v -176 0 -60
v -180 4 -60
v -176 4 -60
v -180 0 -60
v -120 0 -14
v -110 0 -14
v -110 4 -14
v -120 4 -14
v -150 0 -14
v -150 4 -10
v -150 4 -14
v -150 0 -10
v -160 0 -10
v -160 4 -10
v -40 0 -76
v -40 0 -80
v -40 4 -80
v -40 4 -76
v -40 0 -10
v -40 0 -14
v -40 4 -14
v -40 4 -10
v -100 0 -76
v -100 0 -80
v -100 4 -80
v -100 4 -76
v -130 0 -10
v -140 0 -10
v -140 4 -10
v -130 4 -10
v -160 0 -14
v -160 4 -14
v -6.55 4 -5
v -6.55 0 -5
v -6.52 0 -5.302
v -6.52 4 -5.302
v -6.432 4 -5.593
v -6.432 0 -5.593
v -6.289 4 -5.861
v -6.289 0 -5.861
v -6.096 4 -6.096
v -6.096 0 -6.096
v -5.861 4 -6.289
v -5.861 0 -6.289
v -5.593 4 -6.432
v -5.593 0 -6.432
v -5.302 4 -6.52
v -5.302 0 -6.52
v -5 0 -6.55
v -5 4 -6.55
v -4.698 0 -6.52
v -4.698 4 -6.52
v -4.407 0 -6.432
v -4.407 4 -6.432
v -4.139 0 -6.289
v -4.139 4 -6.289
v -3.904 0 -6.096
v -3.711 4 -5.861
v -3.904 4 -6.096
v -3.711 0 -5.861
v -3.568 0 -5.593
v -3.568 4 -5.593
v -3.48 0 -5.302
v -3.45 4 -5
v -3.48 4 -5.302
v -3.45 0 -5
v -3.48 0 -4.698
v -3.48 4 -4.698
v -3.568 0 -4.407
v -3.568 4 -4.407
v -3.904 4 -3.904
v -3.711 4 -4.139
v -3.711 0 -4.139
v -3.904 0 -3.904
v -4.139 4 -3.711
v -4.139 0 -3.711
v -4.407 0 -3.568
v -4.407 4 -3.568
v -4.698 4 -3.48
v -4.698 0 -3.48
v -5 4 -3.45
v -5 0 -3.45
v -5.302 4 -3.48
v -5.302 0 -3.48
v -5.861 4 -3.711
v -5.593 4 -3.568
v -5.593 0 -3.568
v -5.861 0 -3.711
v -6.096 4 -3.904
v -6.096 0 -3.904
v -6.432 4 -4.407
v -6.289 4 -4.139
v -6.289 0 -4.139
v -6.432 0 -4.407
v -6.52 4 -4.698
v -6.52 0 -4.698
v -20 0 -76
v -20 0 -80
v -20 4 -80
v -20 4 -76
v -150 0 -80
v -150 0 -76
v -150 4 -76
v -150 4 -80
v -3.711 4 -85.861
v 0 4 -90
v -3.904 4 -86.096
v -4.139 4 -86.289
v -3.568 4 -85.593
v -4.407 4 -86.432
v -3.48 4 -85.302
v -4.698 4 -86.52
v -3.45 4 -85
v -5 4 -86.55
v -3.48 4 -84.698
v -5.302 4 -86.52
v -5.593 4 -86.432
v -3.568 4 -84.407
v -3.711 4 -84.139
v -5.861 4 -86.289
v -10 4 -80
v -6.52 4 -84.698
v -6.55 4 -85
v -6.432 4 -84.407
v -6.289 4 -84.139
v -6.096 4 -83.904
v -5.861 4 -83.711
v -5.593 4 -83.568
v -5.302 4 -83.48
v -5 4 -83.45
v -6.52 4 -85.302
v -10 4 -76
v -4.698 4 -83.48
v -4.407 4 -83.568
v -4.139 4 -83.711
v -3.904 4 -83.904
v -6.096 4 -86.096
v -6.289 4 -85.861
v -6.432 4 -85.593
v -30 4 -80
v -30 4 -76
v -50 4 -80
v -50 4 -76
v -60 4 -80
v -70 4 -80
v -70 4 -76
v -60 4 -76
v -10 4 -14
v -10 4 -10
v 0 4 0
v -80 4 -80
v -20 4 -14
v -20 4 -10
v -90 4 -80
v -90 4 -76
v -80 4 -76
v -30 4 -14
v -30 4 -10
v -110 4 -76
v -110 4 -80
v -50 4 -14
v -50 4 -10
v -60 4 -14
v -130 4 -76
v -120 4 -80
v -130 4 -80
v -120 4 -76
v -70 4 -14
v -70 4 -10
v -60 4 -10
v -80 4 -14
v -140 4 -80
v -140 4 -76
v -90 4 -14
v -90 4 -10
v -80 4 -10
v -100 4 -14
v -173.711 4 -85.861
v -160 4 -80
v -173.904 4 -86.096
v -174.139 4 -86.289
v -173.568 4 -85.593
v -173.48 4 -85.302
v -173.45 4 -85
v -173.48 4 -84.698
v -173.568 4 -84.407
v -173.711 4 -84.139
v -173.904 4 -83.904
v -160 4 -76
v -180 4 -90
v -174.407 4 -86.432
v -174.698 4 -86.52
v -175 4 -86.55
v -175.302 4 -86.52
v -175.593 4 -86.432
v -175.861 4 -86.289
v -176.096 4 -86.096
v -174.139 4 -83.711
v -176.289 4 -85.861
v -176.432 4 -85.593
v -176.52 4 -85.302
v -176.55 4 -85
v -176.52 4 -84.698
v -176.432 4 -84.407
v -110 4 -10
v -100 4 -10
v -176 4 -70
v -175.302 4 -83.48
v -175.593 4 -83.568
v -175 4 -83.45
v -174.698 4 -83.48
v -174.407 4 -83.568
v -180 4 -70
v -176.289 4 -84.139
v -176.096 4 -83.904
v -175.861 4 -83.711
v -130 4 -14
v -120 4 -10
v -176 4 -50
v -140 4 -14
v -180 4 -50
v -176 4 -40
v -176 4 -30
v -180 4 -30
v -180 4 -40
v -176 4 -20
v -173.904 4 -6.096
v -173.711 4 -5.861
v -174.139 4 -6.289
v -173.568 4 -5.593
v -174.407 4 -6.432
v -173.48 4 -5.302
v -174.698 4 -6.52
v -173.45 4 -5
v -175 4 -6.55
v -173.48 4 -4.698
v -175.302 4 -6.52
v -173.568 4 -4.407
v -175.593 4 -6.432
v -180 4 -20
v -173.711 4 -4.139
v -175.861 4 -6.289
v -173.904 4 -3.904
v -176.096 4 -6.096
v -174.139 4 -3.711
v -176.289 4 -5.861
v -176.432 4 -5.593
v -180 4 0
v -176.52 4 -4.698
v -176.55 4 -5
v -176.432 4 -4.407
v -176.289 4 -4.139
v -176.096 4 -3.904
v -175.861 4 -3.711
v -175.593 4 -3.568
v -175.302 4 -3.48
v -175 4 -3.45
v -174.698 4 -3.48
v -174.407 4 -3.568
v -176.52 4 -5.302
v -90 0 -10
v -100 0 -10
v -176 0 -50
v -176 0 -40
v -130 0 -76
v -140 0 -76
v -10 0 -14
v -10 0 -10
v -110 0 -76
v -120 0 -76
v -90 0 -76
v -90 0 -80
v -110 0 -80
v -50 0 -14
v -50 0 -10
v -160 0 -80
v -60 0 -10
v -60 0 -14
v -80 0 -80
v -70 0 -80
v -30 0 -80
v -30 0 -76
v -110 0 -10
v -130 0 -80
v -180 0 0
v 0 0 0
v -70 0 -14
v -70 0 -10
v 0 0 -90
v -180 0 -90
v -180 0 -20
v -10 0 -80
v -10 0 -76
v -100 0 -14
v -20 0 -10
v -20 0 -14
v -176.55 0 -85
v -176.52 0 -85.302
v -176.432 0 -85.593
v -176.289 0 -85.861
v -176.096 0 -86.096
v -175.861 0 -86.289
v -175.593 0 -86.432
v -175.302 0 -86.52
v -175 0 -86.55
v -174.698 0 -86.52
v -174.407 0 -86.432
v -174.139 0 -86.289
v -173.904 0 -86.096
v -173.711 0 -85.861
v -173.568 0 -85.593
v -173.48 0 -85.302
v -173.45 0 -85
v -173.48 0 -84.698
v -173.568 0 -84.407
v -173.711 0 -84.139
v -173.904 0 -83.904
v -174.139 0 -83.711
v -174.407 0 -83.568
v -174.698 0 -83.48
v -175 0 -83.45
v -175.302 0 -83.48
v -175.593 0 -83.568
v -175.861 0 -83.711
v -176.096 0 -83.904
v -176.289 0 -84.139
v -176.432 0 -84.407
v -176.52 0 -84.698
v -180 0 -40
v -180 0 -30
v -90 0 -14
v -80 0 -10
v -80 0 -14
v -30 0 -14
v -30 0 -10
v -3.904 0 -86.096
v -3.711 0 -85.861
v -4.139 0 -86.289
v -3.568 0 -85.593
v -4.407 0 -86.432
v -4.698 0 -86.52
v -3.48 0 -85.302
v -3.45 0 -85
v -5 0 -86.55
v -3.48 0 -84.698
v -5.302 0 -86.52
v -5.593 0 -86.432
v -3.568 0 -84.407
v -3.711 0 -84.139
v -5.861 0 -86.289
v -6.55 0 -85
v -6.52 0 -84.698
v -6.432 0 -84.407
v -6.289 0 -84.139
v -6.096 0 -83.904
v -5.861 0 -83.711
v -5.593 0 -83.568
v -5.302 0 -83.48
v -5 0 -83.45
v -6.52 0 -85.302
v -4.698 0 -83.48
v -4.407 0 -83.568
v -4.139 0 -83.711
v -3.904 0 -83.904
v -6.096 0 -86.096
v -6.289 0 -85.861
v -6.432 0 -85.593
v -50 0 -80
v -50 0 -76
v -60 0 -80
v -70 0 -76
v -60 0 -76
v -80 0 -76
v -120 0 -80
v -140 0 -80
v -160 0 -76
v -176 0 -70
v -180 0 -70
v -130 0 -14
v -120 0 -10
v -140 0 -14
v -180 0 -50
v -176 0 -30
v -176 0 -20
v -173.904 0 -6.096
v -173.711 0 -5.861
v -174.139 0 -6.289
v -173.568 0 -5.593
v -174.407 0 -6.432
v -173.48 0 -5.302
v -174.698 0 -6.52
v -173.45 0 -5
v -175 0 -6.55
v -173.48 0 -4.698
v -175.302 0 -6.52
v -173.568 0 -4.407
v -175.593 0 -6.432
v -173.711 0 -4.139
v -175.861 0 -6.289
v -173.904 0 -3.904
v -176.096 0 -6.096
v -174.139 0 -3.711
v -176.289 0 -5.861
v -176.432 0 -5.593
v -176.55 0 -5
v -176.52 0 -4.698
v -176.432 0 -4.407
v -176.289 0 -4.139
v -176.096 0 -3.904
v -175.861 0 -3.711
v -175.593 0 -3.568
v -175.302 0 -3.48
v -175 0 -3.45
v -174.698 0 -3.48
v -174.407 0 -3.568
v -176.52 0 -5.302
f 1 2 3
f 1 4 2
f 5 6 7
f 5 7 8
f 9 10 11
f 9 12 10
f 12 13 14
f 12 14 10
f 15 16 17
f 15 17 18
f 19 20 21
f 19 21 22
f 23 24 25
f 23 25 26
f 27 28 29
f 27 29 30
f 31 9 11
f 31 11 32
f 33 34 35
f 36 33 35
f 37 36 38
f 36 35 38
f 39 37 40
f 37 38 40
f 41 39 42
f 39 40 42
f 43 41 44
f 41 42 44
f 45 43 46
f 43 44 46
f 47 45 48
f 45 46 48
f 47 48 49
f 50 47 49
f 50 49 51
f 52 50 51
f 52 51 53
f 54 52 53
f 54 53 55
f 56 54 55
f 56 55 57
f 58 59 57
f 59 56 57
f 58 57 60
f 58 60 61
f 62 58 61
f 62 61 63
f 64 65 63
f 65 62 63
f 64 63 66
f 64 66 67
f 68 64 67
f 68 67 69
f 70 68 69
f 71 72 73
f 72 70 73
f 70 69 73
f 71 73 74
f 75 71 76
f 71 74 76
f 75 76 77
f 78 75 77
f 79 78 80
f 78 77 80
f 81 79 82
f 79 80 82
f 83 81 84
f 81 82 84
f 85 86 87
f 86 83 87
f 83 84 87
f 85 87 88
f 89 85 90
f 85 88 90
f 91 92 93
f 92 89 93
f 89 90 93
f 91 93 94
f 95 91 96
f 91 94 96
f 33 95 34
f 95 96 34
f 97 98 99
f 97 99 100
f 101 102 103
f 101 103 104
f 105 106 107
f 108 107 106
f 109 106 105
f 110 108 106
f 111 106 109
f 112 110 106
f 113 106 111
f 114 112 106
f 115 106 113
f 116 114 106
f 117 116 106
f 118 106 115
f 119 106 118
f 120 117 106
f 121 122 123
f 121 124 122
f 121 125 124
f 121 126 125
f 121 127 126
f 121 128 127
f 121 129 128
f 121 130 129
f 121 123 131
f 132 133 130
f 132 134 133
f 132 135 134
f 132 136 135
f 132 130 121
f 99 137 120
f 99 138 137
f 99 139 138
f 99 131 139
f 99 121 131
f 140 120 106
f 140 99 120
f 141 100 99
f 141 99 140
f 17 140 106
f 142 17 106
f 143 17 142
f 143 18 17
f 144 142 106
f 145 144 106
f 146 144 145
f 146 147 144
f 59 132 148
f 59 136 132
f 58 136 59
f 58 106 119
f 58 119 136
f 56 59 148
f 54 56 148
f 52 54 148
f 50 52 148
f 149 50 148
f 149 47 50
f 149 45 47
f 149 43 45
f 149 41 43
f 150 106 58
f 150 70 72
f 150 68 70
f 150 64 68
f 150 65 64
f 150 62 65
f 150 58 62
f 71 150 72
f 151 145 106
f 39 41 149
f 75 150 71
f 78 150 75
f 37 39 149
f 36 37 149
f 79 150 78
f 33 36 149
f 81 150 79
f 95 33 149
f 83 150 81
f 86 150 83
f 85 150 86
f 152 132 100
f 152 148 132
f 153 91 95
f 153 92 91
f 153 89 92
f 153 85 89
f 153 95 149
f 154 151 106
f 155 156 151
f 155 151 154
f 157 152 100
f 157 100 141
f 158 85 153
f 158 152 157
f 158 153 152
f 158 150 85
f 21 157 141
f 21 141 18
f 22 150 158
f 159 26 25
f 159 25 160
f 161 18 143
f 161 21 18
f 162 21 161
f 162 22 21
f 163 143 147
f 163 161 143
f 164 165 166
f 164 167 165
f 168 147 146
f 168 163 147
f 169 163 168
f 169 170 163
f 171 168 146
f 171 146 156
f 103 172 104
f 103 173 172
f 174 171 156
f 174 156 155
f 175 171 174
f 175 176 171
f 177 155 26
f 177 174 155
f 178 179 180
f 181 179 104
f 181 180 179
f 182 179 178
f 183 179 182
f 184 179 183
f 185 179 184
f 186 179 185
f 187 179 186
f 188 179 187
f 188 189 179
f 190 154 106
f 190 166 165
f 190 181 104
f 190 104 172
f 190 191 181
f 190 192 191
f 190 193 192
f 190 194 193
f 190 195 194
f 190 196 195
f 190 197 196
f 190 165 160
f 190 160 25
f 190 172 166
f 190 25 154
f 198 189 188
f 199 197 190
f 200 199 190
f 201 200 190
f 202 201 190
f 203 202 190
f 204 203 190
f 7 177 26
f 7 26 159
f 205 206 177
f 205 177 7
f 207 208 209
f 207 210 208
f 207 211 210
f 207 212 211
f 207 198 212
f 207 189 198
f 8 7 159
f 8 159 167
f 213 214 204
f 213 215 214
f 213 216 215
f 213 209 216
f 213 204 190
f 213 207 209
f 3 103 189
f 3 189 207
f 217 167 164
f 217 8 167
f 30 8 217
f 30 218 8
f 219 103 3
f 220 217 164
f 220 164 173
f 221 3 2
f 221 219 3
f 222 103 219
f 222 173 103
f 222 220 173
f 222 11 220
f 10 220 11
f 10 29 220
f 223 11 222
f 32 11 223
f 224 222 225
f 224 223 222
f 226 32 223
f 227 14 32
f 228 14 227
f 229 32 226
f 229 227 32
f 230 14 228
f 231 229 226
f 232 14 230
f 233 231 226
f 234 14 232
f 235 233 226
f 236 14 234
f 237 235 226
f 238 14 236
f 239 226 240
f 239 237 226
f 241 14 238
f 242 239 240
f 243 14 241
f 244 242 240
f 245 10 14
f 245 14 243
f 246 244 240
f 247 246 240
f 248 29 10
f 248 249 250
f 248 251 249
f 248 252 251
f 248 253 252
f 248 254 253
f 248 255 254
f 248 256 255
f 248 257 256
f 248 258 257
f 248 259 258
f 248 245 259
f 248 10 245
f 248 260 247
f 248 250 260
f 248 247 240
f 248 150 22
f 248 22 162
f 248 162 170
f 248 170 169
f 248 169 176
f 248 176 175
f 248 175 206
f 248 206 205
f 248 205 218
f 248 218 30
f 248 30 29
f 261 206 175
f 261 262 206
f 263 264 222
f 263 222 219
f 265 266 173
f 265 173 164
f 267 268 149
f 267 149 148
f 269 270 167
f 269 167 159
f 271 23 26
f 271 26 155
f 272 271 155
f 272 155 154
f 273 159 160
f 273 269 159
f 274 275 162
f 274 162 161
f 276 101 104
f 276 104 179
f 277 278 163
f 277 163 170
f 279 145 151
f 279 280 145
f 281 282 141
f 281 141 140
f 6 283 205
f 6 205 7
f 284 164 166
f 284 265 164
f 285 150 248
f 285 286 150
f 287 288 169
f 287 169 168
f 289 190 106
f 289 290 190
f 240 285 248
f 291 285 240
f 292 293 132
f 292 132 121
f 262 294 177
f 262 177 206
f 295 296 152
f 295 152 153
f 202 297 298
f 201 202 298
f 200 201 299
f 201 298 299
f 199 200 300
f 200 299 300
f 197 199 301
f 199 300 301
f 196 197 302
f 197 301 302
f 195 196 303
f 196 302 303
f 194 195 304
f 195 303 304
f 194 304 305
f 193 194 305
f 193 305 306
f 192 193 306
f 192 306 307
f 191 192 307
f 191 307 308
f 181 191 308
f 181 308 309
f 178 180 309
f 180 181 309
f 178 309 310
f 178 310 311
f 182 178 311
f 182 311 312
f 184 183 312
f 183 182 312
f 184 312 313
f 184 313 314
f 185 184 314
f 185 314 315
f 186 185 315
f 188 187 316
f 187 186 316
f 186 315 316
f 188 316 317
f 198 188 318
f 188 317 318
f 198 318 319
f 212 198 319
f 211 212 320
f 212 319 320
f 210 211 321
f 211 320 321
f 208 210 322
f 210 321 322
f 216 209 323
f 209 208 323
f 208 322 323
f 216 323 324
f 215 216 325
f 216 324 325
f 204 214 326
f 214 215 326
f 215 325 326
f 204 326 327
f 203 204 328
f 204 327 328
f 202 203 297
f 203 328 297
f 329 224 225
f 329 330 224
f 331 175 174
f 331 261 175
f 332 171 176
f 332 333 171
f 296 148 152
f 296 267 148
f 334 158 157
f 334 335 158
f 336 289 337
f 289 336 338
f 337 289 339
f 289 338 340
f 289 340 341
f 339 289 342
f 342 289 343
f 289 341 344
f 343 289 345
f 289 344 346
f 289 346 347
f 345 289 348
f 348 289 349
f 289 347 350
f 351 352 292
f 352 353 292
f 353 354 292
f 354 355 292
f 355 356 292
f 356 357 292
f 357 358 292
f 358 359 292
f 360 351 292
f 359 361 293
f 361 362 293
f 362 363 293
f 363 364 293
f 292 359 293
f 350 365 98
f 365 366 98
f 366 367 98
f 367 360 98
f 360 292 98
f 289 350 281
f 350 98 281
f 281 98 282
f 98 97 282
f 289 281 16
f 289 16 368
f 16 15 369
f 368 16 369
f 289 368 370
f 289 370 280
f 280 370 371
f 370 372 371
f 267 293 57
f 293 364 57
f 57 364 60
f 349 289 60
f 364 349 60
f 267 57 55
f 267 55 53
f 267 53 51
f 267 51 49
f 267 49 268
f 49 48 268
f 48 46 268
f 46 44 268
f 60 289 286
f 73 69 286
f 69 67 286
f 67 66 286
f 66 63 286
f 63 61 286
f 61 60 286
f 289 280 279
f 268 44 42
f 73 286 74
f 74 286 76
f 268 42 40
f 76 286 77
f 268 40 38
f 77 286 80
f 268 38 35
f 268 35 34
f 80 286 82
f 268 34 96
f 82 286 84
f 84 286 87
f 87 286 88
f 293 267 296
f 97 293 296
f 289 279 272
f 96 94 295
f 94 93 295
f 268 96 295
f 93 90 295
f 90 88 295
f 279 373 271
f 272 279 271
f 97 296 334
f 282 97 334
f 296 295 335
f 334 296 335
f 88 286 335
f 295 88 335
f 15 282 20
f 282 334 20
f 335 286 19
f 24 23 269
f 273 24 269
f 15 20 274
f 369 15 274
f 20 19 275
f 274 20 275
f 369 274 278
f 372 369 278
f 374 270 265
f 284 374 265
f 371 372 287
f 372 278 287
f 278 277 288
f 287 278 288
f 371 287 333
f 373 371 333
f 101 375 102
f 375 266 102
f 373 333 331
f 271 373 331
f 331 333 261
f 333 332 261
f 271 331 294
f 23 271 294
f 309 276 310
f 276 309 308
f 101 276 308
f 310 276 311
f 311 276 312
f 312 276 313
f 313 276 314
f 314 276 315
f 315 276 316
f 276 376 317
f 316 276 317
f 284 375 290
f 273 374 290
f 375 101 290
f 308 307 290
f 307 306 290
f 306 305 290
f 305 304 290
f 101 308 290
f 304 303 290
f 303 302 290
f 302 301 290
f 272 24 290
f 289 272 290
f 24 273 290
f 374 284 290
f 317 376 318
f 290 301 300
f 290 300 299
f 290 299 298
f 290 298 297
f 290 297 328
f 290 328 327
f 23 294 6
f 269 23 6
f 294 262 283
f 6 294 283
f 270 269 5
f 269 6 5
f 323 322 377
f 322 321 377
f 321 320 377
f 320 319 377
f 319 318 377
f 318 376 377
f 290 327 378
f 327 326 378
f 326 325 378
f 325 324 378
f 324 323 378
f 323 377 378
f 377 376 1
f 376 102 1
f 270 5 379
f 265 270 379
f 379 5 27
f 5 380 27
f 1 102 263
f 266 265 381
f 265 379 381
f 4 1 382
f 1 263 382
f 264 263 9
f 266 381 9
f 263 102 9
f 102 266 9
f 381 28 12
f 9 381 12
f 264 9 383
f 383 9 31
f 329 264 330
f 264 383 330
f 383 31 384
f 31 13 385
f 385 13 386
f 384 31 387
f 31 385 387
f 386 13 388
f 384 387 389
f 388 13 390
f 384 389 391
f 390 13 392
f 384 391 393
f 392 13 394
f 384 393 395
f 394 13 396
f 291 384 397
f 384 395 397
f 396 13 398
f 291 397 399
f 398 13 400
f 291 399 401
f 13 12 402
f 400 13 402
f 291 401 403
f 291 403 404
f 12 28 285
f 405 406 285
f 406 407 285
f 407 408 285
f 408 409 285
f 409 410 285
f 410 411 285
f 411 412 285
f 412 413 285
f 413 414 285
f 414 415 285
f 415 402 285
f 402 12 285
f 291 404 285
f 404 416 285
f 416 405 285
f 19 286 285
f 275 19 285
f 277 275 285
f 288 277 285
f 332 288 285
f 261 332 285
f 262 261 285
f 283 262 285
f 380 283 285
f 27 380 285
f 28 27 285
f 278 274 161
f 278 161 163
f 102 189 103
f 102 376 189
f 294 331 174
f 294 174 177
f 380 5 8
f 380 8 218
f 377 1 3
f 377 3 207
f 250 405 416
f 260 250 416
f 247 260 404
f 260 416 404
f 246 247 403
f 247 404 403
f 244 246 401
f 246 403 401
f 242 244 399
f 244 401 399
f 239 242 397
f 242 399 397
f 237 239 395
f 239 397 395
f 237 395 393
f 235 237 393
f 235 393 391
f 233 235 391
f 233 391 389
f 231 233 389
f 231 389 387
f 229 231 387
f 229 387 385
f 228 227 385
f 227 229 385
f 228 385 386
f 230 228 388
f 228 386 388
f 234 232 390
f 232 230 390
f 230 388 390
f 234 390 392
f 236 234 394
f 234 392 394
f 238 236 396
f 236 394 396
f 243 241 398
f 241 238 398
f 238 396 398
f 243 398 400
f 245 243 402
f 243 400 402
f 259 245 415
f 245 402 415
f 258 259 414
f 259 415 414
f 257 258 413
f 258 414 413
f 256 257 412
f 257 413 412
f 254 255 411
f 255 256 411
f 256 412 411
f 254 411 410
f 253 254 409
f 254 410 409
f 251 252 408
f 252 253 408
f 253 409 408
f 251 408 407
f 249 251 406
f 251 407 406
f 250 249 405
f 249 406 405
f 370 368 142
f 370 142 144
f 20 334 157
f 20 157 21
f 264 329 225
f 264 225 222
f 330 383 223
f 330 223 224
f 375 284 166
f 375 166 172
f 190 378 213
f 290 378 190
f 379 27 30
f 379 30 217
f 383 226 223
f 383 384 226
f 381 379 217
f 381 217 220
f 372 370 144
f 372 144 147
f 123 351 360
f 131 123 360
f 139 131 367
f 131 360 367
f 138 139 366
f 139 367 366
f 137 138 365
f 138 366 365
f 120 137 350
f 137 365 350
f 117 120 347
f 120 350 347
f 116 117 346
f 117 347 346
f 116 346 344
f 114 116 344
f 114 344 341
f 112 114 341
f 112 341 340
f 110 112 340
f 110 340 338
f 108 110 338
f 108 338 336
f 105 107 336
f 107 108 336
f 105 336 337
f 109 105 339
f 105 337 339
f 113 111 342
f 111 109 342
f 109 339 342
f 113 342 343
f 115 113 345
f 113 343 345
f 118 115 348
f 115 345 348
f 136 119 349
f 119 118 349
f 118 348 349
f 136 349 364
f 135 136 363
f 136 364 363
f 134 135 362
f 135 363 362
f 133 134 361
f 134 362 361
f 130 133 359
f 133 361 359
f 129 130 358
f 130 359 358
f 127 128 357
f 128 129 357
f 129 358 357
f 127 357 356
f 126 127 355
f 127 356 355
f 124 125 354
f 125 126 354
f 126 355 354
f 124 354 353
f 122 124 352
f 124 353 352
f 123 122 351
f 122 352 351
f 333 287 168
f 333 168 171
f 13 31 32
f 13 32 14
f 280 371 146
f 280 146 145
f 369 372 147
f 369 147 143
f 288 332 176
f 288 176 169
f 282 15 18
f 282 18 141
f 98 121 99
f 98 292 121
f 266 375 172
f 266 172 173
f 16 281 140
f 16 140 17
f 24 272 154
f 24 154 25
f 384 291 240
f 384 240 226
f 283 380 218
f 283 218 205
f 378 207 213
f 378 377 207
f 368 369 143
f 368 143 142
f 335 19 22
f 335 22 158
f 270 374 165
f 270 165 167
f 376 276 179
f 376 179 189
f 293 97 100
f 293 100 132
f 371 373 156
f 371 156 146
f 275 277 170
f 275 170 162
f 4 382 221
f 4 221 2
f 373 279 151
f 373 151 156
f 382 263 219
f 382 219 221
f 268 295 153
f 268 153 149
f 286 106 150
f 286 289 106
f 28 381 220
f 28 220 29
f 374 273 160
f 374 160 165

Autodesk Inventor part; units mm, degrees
ref_plane "YZ Plane" through (0, 0, 0) normal (1, 0, 0) x (0, 1, 0)
ref_plane "XZ Plane" through (0, 0, 0) normal (0, 1, 0) x (-1, 0, 0)
ref_plane "XY Plane" through (0, 0, 0) normal (0, 0, 1) x (1, 0, 0)
sketch "スケッチ1" plane through (0, 0, 0) normal (0, 1, 0) x (-1, 0, 0)
  line L0 (0, 0) -> (180, 0)
  line L1 (180, 0) -> (180, -90)
  line L2 (180, -90) -> (0, -90)
  line L3 (0, -90) -> (0, 0)
  line L4 (20, -10) -> (10, -10)
  line L5 (10, -10) -> (10, -14)
  line L6 (10, -14) -> (20, -14)
  line L7 (20, -14) -> (20, -10)
  line L8 (20, -76) -> (10, -76)
  line L9 (10, -76) -> (10, -80)
  line L10 (10, -80) -> (20, -80)
  line L11 (20, -80) -> (20, -76)
  line L12 (40, -76) -> (30, -76)
  line L13 (30, -76) -> (30, -80)
  line L14 (30, -80) -> (40, -80)
  line L15 (40, -80) -> (40, -76)
  line L16 (40, -10) -> (30, -10)
  line L17 (30, -10) -> (30, -14)
  line L18 (40, -14) -> (40, -10)
  line L19 (30, -14) -> (40, -14)
  line L20 (60, -76) -> (50, -76)
  line L21 (50, -76) -> (50, -80)
  line L22 (50, -80) -> (60, -80)
  line L23 (60, -80) -> (60, -76)
  line L24 (60, -10) -> (50, -10)
  line L25 (50, -10) -> (50, -14)
  line L26 (60, -14) -> (60, -10)
  line L27 (50, -14) -> (60, -14)
  line L28 (80, -76) -> (70, -76)
  line L29 (70, -76) -> (70, -80)
  line L30 (70, -80) -> (80, -80)
  line L31 (80, -80) -> (80, -76)
  line L32 (80, -10) -> (70, -10)
  line L33 (70, -10) -> (70, -14)
  line L34 (80, -14) -> (80, -10)
  line L35 (70, -14) -> (80, -14)
  line L36 (100, -76) -> (90, -76)
  line L37 (90, -76) -> (90, -80)
  line L38 (90, -80) -> (100, -80)
  line L39 (100, -80) -> (100, -76)
  line L40 (100, -10) -> (90, -10)
  line L41 (90, -10) -> (90, -14)
  line L42 (100, -14) -> (100, -10)
  line L43 (90, -14) -> (100, -14)
  line L44 (120, -76) -> (110, -76)
  line L45 (110, -76) -> (110, -80)
  line L46 (110, -80) -> (120, -80)
  line L47 (120, -80) -> (120, -76)
  line L48 (120, -10) -> (110, -10)
  line L49 (110, -10) -> (110, -14)
  line L50 (120, -14) -> (120, -10)
  line L51 (110, -14) -> (120, -14)
  line L52 (140, -76) -> (130, -76)
  line L53 (130, -76) -> (130, -80)
  line L54 (130, -80) -> (140, -80)
  line L55 (140, -80) -> (140, -76)
  line L56 (140, -10) -> (130, -10)
  line L57 (130, -10) -> (130, -14)
  line L58 (140, -14) -> (140, -10)
  line L59 (130, -14) -> (140, -14)
  line L60 (160, -76) -> (150, -76)
  line L61 (150, -76) -> (150, -80)
  line L62 (150, -80) -> (160, -80)
  line L63 (160, -80) -> (160, -76)
  line L64 (160, -10) -> (150, -10)
  line L65 (150, -10) -> (150, -14)
  line L66 (160, -14) -> (160, -10)
  line L67 (150, -14) -> (160, -14)
  line L68 (180, -20) -> (176, -20)
  line L69 (176, -20) -> (176, -30)
  line L70 (176, -30) -> (180, -30)
  line L71 (180, -30) -> (180, -20)
  line L72 (176, -40) -> (176, -50)
  line L73 (180, -40) -> (176, -40)
  line L74 (176, -50) -> (180, -50)
  line L75 (180, -50) -> (180, -40)
  line L76 (176, -60) -> (176, -70)
  line L77 (180, -60) -> (176, -60)
  line L78 (176, -70) -> (180, -70)
  line L79 (180, -70) -> (180, -60)
  circle A0 centre (5, -5) radius 1.55
  circle A1 centre (5, -85) radius 1.55
  circle A2 centre (175, -85) radius 1.55
  circle A3 centre (175, -5) radius 1.55
  point P0 (10, -78)
  point P1 (30, -78)
  point P2 (50, -78)
  point P3 (70, -78)
  point P4 (90, -78)
  point P5 (110, -78)
  point P6 (130, -78)
  point P7 (150, -78)
  dimension "d0" = 180
  dimension "d1" = 90
  dimension "d2" = 10
  dimension "d3" = 4
  dimension "d4" = 10
  dimension "d5" = 10
  dimension "d6" = 10
  dimension "d7" = 4
  dimension "d8" = 10
  dimension "d9" = 10
  dimension "d12" = 20
  dimension "d17" = 4
  dimension "d18" = 10
  dimension "d19" = 20
  dimension "d22" = 20
  dimension "d27" = 0
  dimension "d28" = 3.1
  dimension "d29" = 3.1
  dimension "d30" = 3.1
  dimension "d31" = 3.1
  dimension "d32" = 5
  dimension "d33" = 5
  dimension "d34" = 5
  dimension "d35" = 5
  dimension "d36" = 5
  dimension "d37" = 5
  dimension "d39" = 5
  dimension "d40" = 5
extrude "押し出し1" add sketch "スケッチ1" along normal blind 4 contours L0 L1 L68 L69 L70 L73 L72 L74 L77 L76 L78 L2 L3
properties part number "ER_lipo_bottom_1" material "木材 (オーク)"
